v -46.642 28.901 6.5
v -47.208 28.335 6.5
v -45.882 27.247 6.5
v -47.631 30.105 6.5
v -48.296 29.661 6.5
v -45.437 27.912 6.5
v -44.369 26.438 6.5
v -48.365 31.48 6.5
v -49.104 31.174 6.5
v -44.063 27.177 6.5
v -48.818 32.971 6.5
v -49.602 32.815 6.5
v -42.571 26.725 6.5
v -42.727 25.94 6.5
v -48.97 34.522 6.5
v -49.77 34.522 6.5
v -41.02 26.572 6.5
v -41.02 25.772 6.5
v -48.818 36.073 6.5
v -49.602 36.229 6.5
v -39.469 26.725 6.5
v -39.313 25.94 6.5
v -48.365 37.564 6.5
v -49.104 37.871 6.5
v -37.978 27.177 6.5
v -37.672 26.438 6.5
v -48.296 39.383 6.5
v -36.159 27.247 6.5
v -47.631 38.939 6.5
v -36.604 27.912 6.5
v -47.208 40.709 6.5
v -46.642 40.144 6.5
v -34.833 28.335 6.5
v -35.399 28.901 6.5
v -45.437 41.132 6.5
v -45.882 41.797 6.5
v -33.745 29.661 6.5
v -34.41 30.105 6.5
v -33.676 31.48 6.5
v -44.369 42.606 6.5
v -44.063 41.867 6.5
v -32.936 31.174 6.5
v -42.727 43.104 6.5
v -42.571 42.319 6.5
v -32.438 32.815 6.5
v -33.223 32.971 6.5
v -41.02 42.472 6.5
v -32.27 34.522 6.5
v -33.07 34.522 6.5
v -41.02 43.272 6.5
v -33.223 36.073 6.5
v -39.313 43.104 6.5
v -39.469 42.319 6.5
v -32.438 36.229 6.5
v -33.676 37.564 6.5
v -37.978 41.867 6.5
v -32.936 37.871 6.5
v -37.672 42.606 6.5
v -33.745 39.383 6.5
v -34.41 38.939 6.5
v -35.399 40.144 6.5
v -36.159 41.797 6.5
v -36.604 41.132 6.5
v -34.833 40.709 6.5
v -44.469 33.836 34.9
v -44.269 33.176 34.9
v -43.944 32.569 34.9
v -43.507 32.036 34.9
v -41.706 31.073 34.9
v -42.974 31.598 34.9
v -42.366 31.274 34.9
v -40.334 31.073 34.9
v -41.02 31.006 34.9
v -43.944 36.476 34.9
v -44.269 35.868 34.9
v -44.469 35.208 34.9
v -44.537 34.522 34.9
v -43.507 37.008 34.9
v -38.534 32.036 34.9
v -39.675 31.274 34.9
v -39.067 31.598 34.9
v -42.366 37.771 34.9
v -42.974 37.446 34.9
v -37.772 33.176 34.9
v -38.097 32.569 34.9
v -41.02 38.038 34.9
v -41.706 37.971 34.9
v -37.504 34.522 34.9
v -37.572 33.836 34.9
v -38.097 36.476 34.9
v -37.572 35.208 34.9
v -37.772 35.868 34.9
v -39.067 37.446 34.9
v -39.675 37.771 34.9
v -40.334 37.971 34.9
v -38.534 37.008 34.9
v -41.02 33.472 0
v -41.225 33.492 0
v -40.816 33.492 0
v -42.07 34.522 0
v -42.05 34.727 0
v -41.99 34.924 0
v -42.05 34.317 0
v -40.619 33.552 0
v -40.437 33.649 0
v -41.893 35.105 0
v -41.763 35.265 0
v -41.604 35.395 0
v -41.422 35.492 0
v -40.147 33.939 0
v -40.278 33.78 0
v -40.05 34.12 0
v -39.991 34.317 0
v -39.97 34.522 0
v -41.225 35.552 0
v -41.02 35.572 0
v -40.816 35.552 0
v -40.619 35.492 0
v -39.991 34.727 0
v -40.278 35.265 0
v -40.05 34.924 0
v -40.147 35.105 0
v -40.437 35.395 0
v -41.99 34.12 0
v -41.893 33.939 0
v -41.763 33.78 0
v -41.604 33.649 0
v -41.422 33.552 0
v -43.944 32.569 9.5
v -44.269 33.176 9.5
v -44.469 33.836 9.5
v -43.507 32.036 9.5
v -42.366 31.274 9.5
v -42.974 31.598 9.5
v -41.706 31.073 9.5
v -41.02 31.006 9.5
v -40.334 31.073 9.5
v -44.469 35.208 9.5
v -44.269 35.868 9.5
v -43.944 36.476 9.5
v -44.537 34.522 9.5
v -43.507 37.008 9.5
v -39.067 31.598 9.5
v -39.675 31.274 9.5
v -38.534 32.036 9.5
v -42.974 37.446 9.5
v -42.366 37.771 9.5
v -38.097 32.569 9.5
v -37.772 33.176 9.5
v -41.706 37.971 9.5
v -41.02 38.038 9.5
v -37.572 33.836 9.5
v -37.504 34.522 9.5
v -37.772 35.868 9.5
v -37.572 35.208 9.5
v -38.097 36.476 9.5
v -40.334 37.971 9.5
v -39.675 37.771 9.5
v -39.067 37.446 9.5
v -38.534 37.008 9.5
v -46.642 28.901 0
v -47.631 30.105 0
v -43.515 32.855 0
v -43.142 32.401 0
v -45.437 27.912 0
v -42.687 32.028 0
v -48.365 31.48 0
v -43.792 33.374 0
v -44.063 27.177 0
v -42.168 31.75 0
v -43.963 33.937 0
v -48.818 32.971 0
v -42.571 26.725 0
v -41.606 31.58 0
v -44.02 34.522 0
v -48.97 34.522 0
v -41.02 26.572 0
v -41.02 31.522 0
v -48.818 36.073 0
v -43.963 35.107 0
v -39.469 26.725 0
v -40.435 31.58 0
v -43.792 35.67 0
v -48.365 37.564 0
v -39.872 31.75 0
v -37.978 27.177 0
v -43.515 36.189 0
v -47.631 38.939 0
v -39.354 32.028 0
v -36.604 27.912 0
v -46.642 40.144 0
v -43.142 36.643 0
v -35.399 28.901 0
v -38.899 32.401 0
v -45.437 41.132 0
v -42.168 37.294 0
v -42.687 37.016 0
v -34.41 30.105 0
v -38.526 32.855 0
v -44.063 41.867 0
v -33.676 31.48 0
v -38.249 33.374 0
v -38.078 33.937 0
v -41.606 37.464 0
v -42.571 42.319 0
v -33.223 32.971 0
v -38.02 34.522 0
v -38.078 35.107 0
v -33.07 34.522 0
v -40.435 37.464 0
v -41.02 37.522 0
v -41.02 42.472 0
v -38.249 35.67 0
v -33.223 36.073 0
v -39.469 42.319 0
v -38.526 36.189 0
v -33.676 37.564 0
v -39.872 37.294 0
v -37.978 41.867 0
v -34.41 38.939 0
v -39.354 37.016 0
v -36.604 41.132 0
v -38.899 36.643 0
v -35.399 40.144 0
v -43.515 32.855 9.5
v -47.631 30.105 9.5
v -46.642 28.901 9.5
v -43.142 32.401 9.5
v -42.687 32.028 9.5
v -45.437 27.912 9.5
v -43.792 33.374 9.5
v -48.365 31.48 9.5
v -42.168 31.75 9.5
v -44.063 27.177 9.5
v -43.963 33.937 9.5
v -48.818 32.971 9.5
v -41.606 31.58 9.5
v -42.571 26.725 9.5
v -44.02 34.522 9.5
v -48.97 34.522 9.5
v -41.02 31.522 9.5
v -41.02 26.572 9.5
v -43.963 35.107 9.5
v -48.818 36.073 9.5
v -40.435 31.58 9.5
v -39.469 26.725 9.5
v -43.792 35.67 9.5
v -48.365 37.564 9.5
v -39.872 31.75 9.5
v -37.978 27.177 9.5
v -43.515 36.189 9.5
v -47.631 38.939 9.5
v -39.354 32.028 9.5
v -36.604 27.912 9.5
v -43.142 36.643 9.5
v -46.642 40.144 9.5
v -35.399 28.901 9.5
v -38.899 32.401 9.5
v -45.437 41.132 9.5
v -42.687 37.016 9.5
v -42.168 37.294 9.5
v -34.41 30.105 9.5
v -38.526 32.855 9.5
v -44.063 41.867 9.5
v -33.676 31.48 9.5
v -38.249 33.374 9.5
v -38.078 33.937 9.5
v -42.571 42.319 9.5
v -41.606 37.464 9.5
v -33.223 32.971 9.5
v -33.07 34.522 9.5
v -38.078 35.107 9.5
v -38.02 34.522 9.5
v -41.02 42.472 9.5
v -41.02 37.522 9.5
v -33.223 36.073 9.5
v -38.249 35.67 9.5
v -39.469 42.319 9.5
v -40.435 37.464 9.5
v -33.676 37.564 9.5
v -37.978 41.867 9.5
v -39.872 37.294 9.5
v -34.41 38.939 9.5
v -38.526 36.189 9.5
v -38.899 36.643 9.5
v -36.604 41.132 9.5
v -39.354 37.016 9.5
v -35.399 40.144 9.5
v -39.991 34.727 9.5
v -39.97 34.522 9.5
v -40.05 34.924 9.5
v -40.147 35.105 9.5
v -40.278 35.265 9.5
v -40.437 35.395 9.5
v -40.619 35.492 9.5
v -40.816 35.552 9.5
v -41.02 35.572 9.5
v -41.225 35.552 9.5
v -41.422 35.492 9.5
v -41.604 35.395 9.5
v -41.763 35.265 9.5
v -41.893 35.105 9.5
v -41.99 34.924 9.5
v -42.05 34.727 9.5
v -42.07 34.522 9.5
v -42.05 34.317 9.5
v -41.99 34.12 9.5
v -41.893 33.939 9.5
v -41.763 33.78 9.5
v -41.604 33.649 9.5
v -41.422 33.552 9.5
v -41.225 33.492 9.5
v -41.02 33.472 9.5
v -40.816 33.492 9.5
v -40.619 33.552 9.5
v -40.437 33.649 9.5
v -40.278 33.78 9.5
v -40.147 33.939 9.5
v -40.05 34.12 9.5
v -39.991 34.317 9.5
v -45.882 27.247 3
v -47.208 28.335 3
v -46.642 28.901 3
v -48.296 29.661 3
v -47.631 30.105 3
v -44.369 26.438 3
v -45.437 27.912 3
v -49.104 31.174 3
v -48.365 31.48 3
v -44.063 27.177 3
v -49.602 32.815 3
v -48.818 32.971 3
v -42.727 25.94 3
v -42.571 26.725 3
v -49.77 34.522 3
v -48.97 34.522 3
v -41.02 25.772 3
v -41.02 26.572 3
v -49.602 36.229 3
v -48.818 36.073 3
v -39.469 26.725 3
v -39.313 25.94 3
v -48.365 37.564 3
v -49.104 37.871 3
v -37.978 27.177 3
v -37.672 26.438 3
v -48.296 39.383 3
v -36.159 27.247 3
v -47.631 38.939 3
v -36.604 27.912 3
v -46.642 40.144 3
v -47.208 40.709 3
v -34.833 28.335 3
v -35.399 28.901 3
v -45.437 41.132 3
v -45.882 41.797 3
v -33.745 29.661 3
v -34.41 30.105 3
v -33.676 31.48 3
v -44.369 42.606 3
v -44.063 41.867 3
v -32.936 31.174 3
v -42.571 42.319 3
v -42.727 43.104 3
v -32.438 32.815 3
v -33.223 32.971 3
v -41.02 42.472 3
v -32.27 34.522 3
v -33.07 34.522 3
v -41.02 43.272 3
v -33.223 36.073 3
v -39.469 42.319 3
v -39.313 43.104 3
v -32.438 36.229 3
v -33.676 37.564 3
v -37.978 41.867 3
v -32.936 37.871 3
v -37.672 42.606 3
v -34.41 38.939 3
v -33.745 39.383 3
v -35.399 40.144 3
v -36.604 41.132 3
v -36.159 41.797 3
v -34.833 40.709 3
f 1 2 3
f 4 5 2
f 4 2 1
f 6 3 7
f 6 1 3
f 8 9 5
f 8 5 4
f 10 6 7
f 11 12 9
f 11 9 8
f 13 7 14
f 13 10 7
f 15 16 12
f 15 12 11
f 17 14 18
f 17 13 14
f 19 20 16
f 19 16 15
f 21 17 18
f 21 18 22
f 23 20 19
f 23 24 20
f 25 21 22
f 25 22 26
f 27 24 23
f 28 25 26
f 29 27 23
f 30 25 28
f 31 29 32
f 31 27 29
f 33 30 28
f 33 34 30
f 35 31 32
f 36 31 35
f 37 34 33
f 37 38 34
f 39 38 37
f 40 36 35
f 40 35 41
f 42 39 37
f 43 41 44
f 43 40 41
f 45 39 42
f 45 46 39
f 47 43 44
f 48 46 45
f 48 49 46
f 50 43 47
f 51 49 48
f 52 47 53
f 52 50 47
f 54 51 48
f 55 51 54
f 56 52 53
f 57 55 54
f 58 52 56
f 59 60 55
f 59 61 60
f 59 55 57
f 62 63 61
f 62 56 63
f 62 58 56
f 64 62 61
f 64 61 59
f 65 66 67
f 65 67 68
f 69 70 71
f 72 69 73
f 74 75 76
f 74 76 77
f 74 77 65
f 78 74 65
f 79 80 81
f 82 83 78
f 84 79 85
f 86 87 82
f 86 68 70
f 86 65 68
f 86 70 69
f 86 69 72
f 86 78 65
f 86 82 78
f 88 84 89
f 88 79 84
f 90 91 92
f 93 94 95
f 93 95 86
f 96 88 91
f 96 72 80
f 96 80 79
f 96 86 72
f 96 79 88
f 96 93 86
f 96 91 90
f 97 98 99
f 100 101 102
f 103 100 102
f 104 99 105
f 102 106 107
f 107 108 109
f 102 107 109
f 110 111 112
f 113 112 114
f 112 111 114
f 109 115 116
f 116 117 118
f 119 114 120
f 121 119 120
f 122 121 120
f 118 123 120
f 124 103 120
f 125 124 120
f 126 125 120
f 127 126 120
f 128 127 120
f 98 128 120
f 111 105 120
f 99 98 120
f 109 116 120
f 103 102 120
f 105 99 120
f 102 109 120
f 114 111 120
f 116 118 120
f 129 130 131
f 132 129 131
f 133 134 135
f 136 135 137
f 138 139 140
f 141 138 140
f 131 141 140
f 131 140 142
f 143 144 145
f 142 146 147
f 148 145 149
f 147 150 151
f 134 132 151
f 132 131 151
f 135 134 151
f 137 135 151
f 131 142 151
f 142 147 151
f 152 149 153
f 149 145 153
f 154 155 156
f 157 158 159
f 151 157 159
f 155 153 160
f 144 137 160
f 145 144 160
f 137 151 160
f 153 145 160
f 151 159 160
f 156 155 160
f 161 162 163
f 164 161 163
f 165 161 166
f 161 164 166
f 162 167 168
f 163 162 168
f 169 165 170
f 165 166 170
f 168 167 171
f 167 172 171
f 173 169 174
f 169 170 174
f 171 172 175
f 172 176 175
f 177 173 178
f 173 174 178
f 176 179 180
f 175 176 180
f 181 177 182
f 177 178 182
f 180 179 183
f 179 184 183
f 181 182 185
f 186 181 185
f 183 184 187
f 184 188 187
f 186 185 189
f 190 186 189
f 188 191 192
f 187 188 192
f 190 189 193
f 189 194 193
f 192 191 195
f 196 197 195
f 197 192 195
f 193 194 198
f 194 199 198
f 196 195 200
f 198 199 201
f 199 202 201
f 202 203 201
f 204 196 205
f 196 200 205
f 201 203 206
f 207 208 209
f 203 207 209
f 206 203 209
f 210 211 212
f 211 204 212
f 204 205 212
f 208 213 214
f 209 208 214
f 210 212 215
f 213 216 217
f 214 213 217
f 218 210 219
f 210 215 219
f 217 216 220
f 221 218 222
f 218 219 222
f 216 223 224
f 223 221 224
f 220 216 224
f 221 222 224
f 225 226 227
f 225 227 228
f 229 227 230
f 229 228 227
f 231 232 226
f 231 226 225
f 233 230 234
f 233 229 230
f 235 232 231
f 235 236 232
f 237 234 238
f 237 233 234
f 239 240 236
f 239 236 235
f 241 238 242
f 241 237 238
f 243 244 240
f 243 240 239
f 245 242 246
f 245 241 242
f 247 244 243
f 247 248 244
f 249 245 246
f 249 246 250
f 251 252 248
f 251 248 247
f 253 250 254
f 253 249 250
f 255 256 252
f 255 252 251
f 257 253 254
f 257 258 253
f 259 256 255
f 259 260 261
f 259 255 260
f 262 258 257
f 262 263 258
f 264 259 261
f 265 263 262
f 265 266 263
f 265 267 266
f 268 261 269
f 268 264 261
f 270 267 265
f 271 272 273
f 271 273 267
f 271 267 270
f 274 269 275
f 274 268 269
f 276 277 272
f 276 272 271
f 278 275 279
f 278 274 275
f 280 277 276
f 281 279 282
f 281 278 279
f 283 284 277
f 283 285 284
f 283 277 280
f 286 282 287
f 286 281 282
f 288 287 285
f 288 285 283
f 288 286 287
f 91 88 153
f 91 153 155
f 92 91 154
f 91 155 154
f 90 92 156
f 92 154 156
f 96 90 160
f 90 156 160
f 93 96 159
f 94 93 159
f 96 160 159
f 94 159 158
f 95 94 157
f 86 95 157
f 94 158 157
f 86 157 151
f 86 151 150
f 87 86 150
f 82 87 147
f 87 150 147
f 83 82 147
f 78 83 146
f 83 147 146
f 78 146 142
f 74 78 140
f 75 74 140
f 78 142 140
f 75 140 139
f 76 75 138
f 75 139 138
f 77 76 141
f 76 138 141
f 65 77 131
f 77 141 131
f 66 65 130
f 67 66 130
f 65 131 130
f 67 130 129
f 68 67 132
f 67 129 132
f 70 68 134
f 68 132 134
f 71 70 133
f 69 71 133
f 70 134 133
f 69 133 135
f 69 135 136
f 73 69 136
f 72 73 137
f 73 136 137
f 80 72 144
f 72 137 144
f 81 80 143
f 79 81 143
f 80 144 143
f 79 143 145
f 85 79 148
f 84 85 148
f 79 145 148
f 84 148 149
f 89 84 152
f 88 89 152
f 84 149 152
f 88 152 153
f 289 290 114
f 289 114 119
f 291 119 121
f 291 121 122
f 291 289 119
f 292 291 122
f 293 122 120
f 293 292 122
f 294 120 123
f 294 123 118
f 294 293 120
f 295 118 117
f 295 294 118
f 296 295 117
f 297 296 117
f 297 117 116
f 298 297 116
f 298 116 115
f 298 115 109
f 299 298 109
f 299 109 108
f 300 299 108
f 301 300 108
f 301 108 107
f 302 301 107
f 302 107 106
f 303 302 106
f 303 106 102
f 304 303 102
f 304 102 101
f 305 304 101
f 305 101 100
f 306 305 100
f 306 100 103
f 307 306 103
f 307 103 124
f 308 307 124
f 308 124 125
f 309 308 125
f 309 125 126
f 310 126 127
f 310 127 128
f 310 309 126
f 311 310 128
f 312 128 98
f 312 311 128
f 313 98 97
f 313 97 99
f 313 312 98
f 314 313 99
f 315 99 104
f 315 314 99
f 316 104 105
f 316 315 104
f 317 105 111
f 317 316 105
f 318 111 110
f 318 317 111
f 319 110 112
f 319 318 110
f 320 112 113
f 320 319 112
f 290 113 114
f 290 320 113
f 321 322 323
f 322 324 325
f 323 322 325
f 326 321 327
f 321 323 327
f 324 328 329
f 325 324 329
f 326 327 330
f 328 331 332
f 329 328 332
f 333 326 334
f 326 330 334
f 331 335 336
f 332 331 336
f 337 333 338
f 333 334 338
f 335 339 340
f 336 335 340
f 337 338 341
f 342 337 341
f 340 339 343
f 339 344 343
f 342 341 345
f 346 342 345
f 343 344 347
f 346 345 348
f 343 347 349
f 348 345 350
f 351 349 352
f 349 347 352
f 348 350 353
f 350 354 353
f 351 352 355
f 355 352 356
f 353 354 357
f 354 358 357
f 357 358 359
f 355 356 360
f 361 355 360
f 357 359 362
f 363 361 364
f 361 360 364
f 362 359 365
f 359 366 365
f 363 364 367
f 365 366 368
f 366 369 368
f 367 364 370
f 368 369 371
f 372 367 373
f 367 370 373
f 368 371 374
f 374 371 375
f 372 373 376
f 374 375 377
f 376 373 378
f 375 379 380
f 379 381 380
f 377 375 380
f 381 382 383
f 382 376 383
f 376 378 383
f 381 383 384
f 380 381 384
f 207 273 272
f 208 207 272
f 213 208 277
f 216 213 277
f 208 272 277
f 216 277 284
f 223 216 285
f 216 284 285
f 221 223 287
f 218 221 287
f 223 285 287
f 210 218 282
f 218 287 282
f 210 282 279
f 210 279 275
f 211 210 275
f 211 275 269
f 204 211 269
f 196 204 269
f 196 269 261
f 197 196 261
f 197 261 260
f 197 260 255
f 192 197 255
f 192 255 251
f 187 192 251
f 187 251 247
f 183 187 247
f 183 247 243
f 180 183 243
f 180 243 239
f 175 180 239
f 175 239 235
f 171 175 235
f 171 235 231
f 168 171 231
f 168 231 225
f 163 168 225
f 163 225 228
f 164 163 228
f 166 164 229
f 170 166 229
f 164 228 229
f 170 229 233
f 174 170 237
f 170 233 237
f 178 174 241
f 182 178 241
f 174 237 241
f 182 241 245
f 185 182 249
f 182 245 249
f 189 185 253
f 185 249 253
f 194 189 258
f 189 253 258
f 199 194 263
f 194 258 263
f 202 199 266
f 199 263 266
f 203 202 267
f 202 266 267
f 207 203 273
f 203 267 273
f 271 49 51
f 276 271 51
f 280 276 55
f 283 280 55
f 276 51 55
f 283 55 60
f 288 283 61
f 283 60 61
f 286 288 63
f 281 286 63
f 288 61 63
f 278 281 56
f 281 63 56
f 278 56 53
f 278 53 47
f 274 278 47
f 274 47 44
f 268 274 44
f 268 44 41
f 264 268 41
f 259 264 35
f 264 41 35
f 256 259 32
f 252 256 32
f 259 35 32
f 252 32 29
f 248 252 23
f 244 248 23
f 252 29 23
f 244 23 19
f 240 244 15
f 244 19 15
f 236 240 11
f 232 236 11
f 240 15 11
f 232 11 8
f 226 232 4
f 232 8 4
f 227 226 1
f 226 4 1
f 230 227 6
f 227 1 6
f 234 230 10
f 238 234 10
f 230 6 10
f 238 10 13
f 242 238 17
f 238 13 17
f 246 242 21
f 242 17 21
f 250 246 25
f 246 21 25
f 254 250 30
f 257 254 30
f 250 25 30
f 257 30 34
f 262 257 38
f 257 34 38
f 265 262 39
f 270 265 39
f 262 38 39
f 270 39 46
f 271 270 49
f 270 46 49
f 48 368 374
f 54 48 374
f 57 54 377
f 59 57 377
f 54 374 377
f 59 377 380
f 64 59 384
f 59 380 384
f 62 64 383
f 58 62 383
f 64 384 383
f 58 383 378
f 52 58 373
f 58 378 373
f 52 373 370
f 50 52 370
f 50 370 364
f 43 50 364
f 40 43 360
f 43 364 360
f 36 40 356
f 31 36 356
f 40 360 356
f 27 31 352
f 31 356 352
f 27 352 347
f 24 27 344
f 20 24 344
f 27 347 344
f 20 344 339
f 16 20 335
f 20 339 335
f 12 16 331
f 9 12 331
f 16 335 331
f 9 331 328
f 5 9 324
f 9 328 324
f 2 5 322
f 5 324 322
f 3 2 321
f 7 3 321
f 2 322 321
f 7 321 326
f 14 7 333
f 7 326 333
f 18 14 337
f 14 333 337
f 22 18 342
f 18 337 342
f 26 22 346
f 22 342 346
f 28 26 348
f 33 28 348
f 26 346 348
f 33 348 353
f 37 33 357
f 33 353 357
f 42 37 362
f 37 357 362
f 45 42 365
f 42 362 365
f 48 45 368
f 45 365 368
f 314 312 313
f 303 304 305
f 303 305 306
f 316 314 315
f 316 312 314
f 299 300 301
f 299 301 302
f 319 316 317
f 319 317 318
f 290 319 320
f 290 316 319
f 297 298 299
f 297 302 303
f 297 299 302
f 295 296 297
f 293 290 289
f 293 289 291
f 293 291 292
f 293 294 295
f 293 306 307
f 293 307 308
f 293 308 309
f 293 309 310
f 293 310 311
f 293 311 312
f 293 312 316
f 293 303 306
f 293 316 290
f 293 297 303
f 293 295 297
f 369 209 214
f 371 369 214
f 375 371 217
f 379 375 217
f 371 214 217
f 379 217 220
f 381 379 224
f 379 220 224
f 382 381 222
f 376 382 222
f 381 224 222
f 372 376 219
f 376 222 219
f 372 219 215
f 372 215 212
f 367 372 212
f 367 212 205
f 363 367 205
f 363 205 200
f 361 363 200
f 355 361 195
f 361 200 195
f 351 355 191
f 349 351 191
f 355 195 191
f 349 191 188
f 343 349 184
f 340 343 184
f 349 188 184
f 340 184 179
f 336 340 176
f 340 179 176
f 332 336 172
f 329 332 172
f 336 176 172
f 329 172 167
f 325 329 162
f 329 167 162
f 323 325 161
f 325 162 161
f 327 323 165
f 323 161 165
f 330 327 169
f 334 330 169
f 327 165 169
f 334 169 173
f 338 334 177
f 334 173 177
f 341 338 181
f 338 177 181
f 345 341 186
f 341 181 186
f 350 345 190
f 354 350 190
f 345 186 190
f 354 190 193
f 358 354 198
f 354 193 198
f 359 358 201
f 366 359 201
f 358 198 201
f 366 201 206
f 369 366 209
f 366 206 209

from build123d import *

# Parameters (mm, degrees)
F0_R      = 7.95
F1_DEPTH  = 3
F2_R      = 8.75
F3_DEPTH  = 3.5
F4_R      = 7.95
F5_DEPTH  = 3
F6_R      = 3
F6_R_2    = 1.05
F7_DEPTH  = 10
F10_R     = 3.51623502
F11_DEPTH = 25.4


# Not quite as in the source:
# - a feature of the source that left no trace in its solid (it failed there, or was rolled back) is left out


with BuildPart() as f1:
    # F0 (on Top) → F1 (new body)
    with BuildSketch(Plane.XY):
        with Locations((-41.0203561187, 34.5220826566)):
            Circle(F0_R)
    extrude(amount=F1_DEPTH)

    # F2 (on face) → F3 (join)
    with BuildSketch(Plane.XY.offset(3)):
        with Locations((-41.0203561187, 34.5220826566)):
            Circle(F2_R)
    extrude(amount=F3_DEPTH)

    # F4 (on face) → F5 (join)
    with BuildSketch(Plane.XY.offset(6.5)):
        with Locations((-41.0203561187, 34.5220826566)):
            Circle(F4_R)
    extrude(amount=F5_DEPTH)

    # F6 (on face) → F7 (cut)
    with BuildSketch(Plane.XY.offset(9.5)):
        with Locations((-41.0203561187, 34.5220826566)):
            Circle(F6_R)
        with Locations((-41.0203561187, 34.5220826566)):
            Circle(F6_R_2, mode=Mode.SUBTRACT)
    extrude(amount=-F7_DEPTH, mode=Mode.SUBTRACT)


with BuildPart() as f11:
    # F10 (on face) → F11 (new body)
    with BuildSketch(Plane.XY.offset(9.5)):
        with Locations((-41.0203561187, 34.5220826566)):
            Circle(F10_R)
    extrude(amount=F11_DEPTH)


solid = Compound([f1.part, f11.part])
